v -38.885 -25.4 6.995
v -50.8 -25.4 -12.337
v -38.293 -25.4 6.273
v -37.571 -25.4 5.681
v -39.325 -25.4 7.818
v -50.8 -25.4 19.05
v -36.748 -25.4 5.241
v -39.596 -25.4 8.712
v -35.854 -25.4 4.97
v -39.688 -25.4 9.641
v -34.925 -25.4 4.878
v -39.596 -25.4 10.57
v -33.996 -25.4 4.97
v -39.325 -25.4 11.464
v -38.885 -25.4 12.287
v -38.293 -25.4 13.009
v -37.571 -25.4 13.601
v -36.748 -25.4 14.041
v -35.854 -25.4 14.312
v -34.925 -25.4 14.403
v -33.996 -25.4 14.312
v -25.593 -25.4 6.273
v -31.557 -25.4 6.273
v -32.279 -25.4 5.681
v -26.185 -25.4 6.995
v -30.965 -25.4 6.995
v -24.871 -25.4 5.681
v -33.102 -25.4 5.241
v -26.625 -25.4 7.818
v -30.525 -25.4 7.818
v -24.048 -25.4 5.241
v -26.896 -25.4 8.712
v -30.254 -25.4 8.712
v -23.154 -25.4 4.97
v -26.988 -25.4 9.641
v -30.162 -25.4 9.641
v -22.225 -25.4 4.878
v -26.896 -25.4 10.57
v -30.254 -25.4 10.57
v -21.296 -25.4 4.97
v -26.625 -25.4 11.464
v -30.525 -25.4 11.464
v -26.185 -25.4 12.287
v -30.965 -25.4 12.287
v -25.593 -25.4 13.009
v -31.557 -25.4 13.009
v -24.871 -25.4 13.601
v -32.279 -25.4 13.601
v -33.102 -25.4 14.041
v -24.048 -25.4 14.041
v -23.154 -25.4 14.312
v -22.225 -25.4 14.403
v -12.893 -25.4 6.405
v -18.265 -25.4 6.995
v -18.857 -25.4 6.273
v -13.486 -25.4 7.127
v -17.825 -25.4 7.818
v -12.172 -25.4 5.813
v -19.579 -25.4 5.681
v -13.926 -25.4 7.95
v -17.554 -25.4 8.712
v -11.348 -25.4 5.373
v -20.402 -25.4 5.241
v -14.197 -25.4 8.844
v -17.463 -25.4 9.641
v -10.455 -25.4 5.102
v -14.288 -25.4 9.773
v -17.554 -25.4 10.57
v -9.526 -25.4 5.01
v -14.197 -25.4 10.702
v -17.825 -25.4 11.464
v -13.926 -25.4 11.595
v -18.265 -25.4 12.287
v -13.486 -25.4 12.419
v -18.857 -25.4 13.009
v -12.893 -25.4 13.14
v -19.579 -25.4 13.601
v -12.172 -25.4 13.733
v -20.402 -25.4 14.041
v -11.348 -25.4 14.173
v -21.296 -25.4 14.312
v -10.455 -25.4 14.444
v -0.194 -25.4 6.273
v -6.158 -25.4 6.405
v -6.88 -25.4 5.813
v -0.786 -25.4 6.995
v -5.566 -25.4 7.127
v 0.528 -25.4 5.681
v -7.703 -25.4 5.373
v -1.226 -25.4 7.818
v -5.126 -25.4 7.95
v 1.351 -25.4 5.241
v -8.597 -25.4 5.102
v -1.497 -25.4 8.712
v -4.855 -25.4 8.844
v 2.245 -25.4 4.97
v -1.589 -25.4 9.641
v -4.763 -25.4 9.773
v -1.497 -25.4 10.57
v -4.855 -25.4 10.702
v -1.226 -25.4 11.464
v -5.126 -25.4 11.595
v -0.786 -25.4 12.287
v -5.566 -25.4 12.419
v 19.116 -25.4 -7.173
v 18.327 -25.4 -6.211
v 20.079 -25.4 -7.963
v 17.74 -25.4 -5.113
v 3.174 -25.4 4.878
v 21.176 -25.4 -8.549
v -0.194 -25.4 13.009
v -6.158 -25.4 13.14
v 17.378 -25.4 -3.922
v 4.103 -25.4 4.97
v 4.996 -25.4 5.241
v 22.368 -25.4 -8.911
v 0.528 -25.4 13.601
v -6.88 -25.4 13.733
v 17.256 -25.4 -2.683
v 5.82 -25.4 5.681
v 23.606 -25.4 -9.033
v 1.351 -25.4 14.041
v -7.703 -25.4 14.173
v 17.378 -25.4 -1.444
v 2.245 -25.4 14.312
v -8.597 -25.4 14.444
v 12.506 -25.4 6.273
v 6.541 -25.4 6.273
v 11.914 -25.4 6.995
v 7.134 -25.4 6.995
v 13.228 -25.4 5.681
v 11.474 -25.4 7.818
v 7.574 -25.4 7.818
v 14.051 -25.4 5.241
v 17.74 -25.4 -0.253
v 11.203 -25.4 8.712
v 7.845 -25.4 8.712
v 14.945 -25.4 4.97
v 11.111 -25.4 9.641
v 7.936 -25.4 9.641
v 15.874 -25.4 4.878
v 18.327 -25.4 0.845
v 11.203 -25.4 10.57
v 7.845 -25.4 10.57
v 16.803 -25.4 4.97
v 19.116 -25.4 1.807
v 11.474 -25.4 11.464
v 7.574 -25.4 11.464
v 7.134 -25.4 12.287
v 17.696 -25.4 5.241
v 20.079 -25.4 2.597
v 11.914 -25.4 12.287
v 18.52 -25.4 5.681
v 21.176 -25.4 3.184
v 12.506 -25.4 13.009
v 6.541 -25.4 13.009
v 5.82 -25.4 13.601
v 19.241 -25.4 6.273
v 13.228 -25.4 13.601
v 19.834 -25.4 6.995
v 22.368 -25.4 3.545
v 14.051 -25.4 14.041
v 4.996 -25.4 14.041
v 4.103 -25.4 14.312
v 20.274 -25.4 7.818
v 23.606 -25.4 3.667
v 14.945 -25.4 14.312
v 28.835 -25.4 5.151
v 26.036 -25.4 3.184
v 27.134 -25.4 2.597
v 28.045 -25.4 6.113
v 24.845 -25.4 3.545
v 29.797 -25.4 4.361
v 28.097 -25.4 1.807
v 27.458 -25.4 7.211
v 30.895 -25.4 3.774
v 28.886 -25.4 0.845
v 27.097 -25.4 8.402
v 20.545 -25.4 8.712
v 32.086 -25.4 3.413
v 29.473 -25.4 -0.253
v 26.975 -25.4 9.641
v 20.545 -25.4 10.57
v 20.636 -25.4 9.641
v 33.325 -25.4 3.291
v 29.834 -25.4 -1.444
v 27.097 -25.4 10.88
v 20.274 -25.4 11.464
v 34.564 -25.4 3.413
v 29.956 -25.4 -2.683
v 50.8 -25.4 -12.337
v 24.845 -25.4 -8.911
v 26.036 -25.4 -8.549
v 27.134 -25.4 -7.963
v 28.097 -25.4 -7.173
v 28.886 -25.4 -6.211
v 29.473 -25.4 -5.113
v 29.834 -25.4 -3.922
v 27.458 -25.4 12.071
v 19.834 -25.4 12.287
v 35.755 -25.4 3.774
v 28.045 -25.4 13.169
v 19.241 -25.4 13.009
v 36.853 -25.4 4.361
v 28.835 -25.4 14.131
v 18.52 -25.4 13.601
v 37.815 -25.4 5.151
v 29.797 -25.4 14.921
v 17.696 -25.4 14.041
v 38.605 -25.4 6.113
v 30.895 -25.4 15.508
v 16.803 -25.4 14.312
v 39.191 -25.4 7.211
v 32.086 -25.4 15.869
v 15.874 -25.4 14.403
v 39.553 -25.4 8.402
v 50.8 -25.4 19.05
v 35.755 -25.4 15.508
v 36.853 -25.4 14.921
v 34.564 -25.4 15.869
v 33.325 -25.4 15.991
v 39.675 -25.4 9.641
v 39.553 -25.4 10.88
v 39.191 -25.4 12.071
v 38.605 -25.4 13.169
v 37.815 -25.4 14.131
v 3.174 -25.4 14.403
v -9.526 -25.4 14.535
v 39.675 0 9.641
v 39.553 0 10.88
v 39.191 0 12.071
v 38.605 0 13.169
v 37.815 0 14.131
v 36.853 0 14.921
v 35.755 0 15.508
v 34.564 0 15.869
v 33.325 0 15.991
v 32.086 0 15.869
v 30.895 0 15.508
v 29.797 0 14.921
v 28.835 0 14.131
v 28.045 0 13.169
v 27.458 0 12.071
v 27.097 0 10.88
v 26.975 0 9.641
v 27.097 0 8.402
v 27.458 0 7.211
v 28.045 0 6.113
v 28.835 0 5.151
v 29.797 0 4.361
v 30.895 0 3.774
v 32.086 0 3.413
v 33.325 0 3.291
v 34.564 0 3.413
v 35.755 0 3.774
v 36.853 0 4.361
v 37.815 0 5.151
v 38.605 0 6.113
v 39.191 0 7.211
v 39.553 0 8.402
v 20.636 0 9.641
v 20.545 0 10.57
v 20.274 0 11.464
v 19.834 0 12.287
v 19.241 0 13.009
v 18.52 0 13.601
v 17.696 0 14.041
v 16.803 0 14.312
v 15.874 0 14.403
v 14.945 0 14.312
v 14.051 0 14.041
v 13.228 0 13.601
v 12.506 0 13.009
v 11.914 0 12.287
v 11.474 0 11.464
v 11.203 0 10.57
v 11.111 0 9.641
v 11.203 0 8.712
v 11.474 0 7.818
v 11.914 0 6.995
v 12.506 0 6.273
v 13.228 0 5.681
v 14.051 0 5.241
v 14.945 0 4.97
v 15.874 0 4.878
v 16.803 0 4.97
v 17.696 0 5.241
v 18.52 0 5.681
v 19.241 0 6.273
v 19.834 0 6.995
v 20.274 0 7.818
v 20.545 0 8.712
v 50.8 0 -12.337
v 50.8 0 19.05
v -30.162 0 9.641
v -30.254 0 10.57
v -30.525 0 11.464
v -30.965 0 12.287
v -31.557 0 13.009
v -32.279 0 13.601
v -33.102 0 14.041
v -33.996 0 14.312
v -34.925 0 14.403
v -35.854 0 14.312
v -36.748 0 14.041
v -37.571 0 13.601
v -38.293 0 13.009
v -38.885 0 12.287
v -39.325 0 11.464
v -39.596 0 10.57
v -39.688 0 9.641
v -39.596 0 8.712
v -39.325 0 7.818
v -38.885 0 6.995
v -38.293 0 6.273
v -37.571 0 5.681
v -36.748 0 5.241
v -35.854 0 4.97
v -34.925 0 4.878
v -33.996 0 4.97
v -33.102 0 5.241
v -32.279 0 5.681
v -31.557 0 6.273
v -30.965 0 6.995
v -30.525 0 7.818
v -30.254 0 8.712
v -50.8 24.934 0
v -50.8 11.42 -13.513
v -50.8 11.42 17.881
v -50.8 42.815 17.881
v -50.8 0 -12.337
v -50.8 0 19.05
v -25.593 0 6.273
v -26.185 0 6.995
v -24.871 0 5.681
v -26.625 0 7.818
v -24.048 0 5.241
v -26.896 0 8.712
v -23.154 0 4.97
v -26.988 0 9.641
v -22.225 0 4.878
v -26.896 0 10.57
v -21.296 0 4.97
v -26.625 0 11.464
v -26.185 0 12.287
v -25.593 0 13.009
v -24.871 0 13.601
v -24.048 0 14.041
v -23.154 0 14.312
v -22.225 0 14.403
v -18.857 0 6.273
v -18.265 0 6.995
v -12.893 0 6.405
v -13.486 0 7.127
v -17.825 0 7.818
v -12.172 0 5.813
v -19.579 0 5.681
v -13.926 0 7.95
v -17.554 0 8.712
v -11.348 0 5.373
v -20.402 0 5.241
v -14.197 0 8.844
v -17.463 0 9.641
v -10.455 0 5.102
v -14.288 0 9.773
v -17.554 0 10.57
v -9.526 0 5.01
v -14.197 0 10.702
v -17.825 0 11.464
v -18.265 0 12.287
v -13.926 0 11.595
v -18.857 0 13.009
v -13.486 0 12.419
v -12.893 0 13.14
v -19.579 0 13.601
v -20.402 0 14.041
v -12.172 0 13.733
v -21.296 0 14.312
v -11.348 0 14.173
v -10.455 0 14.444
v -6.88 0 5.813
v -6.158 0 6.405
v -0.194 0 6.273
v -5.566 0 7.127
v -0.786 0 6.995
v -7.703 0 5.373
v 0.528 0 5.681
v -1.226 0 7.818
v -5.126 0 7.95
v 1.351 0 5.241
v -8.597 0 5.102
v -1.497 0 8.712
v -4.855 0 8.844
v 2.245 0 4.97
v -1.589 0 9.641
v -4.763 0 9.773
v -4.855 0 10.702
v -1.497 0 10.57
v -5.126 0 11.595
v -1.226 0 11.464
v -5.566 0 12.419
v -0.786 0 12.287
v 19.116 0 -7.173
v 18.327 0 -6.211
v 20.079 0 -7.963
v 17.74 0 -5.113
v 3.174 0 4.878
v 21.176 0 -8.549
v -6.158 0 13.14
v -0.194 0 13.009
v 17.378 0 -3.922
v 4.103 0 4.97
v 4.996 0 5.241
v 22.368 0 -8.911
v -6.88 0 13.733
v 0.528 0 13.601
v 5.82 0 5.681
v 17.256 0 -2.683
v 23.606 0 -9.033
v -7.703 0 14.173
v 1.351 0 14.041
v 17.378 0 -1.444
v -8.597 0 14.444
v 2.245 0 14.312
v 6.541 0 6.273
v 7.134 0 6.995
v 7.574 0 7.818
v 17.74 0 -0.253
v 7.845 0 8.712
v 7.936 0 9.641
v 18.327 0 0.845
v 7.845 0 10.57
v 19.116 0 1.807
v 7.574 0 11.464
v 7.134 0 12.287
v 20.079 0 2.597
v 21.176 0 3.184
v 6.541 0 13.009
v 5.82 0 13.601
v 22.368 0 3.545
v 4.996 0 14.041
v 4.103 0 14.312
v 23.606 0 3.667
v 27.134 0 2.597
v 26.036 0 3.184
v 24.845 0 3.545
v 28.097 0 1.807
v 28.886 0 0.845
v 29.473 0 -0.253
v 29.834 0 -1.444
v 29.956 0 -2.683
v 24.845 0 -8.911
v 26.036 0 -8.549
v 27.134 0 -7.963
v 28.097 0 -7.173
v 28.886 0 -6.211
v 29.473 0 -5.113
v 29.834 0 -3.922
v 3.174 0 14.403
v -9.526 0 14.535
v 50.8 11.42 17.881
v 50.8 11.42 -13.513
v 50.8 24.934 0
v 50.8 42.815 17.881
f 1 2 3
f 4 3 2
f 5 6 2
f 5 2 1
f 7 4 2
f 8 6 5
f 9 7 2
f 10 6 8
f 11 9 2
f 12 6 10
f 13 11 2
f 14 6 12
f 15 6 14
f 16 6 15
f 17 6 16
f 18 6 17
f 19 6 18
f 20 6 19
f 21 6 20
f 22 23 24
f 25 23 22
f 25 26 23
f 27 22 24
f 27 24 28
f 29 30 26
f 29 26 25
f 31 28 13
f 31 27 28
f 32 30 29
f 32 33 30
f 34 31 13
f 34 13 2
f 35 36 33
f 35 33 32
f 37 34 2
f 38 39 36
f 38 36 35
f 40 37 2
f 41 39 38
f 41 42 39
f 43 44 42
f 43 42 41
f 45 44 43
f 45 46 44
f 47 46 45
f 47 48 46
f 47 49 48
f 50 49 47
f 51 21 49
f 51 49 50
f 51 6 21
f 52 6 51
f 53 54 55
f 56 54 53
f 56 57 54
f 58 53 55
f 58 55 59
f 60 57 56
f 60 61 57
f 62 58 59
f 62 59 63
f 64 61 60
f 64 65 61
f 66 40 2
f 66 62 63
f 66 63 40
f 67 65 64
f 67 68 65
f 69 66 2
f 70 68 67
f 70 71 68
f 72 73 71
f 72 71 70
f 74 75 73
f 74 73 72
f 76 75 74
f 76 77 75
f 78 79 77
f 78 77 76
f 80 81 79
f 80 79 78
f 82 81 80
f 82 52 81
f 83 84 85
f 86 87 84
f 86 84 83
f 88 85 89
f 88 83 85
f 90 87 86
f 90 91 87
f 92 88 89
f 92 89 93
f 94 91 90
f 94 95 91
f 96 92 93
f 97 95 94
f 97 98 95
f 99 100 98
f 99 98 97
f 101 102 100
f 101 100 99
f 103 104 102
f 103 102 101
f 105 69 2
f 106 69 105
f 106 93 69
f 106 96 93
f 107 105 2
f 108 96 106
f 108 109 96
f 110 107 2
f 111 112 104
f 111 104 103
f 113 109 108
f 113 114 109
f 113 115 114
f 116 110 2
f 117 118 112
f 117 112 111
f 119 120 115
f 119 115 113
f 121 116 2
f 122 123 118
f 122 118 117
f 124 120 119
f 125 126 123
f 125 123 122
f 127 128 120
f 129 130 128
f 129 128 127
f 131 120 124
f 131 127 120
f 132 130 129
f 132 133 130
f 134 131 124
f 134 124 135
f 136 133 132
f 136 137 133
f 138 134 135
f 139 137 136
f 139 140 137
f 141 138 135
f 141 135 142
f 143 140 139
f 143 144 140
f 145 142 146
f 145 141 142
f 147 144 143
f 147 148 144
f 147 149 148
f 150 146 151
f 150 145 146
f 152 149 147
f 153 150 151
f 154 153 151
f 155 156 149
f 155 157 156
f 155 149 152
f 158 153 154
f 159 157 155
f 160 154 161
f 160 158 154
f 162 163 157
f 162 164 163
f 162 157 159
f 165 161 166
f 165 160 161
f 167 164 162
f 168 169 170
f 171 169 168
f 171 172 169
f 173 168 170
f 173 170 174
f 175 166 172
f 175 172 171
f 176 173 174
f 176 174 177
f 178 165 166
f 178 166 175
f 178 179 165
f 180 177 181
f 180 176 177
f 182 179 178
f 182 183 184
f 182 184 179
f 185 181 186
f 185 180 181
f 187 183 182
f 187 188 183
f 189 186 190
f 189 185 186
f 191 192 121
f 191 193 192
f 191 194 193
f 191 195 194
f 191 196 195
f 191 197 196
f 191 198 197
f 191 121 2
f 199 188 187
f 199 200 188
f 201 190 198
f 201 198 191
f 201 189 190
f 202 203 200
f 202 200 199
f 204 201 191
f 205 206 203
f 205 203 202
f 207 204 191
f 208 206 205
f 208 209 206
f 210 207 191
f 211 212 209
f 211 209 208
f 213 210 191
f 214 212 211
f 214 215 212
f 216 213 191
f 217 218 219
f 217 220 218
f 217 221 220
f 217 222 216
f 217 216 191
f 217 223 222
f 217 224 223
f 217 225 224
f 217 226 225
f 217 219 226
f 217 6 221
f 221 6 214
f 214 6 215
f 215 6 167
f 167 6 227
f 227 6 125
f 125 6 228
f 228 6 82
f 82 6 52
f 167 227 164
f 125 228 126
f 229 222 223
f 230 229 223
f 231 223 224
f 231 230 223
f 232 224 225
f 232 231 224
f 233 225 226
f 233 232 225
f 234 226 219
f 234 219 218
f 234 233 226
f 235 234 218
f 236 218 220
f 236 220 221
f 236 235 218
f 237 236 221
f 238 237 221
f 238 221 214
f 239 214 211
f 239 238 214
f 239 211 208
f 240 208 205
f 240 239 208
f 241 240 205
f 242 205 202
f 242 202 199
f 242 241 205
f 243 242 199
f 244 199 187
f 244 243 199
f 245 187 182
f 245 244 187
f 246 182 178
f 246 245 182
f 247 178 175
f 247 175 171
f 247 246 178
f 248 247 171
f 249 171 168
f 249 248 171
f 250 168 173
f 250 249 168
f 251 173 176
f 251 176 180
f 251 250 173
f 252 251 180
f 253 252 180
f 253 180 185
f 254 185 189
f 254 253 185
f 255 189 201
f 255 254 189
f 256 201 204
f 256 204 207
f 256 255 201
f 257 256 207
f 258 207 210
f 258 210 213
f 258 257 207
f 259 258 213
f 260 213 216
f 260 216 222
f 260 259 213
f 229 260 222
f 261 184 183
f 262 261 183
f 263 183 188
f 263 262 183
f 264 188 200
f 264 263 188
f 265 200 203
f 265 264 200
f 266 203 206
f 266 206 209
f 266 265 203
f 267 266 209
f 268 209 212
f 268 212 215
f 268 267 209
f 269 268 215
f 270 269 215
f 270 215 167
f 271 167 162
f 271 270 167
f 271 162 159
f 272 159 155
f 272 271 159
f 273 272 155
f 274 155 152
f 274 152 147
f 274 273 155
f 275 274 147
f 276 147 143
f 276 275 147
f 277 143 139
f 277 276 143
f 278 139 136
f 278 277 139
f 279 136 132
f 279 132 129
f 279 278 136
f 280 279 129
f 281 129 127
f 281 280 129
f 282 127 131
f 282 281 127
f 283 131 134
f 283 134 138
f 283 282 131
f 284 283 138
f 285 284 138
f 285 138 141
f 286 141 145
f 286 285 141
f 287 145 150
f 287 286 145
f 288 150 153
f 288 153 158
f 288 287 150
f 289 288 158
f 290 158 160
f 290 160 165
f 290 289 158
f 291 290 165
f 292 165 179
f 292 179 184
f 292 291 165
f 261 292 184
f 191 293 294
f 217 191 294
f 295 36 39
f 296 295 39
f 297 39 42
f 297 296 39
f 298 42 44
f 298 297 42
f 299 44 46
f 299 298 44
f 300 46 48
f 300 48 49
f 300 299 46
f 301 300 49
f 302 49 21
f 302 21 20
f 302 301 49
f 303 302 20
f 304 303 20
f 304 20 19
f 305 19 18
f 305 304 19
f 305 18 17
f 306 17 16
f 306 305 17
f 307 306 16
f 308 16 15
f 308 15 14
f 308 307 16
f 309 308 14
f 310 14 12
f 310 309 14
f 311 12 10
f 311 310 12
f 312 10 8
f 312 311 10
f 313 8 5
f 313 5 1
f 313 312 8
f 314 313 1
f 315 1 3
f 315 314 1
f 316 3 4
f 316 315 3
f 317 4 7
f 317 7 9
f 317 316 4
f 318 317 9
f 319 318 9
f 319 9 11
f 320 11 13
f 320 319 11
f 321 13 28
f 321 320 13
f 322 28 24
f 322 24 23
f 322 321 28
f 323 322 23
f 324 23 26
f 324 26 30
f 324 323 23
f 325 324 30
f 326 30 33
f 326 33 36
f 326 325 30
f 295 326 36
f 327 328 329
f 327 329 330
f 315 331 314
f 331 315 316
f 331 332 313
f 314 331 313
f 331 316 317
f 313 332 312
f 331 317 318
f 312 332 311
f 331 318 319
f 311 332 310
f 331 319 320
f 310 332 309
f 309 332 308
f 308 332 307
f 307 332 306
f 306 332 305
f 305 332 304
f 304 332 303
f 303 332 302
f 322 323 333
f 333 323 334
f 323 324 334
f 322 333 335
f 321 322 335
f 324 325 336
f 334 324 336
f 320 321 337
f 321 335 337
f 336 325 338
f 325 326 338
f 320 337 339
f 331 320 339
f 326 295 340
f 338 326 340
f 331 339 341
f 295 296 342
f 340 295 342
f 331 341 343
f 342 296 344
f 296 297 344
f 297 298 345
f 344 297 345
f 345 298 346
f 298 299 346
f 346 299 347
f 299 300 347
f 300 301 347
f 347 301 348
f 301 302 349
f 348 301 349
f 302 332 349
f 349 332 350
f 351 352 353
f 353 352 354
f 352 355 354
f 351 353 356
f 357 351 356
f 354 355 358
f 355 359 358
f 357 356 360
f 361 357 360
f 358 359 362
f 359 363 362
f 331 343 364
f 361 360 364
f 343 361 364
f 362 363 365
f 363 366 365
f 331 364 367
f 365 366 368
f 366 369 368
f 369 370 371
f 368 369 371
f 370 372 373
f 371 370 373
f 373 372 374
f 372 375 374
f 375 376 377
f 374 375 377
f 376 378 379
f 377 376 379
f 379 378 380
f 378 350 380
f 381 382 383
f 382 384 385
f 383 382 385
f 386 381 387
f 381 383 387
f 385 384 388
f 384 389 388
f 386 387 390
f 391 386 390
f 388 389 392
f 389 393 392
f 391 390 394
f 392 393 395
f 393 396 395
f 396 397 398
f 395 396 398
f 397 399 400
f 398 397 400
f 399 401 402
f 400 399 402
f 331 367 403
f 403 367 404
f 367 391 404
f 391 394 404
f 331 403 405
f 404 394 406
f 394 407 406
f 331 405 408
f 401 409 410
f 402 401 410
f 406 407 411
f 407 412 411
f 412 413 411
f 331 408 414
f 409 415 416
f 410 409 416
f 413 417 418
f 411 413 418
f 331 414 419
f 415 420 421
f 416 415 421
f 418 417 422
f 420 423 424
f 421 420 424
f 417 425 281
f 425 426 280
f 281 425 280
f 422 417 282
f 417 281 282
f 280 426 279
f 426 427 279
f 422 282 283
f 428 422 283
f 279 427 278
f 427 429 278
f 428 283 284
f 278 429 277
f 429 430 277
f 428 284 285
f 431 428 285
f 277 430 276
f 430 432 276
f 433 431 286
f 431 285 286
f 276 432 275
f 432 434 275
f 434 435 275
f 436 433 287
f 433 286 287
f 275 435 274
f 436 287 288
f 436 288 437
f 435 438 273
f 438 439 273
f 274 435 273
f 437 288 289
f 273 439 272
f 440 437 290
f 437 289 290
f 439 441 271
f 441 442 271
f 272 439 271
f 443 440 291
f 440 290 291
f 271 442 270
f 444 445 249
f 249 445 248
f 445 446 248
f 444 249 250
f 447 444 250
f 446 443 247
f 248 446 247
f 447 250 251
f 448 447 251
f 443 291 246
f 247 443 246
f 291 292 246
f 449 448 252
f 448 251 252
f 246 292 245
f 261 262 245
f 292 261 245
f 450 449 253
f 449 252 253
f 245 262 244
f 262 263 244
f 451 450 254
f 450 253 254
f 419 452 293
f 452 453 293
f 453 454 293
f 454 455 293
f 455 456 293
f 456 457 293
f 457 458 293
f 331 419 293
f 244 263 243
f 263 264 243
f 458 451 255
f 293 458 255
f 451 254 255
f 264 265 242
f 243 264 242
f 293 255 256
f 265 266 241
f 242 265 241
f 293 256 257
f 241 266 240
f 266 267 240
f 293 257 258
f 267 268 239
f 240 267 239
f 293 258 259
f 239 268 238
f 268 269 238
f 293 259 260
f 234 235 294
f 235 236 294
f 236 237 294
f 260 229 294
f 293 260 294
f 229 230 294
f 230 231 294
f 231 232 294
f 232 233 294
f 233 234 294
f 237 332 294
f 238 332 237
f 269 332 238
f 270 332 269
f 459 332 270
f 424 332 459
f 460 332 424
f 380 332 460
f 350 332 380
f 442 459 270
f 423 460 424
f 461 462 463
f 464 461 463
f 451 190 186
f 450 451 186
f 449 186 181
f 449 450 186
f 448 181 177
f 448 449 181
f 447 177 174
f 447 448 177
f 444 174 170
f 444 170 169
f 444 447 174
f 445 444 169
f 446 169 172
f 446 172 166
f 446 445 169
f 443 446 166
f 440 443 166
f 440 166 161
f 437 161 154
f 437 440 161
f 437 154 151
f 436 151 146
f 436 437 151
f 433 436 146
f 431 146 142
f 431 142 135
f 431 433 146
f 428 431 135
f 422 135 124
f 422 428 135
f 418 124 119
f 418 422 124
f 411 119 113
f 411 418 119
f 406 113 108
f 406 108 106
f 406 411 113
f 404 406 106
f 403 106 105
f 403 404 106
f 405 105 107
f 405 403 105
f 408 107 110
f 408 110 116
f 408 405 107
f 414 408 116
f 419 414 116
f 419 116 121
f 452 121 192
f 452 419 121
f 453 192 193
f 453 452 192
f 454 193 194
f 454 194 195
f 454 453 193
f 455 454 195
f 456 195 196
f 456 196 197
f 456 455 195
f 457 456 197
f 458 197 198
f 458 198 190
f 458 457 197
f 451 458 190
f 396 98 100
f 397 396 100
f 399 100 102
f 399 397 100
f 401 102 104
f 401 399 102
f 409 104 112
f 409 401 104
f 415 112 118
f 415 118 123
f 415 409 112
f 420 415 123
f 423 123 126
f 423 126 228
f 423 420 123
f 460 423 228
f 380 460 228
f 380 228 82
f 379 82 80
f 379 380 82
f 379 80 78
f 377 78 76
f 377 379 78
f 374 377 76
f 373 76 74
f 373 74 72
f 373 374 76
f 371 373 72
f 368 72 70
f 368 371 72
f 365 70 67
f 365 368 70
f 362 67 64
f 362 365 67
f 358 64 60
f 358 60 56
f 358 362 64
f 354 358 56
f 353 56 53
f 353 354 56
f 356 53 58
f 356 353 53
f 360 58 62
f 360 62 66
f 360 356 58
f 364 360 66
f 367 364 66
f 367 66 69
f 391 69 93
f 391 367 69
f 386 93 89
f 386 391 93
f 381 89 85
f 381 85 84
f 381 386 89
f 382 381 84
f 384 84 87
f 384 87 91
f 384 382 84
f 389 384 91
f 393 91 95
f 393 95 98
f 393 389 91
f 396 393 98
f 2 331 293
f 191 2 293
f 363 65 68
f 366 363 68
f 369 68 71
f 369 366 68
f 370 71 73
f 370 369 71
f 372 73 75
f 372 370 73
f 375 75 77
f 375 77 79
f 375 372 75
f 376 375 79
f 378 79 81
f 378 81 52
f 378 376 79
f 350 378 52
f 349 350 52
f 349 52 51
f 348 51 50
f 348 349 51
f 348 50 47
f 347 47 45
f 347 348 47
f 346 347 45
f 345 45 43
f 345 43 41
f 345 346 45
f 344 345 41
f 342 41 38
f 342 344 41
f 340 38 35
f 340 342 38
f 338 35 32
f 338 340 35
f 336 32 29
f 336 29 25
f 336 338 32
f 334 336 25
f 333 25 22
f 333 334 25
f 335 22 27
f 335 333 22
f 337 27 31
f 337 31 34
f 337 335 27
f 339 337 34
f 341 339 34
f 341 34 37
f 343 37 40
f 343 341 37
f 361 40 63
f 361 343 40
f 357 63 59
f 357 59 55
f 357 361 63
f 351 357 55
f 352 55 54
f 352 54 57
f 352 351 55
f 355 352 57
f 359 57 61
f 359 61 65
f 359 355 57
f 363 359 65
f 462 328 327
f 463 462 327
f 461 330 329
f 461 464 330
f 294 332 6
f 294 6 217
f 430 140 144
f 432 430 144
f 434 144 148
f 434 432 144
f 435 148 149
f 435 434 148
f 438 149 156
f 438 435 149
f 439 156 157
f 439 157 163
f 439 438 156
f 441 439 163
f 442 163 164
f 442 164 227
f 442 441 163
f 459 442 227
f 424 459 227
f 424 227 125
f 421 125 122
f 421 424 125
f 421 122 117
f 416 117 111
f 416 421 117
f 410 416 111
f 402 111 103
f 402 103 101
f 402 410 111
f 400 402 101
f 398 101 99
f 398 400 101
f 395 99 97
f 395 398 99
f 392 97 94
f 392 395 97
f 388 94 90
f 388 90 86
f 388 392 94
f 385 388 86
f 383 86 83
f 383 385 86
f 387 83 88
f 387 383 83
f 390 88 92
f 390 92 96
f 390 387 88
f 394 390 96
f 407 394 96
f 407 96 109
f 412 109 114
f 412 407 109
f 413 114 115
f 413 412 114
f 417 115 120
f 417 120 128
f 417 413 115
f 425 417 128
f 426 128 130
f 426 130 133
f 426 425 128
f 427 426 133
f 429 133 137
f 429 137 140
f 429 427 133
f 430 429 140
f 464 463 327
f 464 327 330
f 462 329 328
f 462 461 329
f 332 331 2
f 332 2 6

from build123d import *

# Parameters (mm, degrees)
F0_W     = 101.6
F0_H     = 31.387029
F0_R     = 6.35
F0_R_2   = 4.7625
F1_DEPTH = 25.4
F3_DEPTH = 50.8


with BuildPart() as f1:
    # F0 (on Front) → F1 (new body)
    with BuildSketch(Plane.XZ):
        with Locations((0, 3.356486)):
            Rectangle(F0_W, F0_H)
        with Locations((23.606425, -2.682731)):
            Circle(F0_R, mode=Mode.SUBTRACT)
        with Locations((-34.925, 9.640971)):
            Circle(F0_R_2, mode=Mode.SUBTRACT)
        with Locations((-22.225, 9.640971)):
            Circle(F0_R_2, mode=Mode.SUBTRACT)
        with Locations((-9.525684, 9.772734)):
            Circle(F0_R_2, mode=Mode.SUBTRACT)
        with Locations((3.173633, 9.640971)):
            Circle(F0_R_2, mode=Mode.SUBTRACT)
        with Locations((15.873633, 9.640971)):
            Circle(F0_R_2, mode=Mode.SUBTRACT)
        with Locations((33.3248, 9.640971)):
            Circle(F0_R, mode=Mode.SUBTRACT)
    extrude(amount=F1_DEPTH)


with BuildPart() as f3:
    # F2 (on Right) → F3 (new body, symmetric)
    with BuildSketch(Plane.YZ):
        Polygon((24.933794, 17.880932), (11.420327, 17.880932), (11.420327, -13.513468), (24.933794, 0), (42.814727, 17.880932), align=None)
    extrude(amount=F3_DEPTH, both=True)


solid = Compound([f1.part, f3.part])
